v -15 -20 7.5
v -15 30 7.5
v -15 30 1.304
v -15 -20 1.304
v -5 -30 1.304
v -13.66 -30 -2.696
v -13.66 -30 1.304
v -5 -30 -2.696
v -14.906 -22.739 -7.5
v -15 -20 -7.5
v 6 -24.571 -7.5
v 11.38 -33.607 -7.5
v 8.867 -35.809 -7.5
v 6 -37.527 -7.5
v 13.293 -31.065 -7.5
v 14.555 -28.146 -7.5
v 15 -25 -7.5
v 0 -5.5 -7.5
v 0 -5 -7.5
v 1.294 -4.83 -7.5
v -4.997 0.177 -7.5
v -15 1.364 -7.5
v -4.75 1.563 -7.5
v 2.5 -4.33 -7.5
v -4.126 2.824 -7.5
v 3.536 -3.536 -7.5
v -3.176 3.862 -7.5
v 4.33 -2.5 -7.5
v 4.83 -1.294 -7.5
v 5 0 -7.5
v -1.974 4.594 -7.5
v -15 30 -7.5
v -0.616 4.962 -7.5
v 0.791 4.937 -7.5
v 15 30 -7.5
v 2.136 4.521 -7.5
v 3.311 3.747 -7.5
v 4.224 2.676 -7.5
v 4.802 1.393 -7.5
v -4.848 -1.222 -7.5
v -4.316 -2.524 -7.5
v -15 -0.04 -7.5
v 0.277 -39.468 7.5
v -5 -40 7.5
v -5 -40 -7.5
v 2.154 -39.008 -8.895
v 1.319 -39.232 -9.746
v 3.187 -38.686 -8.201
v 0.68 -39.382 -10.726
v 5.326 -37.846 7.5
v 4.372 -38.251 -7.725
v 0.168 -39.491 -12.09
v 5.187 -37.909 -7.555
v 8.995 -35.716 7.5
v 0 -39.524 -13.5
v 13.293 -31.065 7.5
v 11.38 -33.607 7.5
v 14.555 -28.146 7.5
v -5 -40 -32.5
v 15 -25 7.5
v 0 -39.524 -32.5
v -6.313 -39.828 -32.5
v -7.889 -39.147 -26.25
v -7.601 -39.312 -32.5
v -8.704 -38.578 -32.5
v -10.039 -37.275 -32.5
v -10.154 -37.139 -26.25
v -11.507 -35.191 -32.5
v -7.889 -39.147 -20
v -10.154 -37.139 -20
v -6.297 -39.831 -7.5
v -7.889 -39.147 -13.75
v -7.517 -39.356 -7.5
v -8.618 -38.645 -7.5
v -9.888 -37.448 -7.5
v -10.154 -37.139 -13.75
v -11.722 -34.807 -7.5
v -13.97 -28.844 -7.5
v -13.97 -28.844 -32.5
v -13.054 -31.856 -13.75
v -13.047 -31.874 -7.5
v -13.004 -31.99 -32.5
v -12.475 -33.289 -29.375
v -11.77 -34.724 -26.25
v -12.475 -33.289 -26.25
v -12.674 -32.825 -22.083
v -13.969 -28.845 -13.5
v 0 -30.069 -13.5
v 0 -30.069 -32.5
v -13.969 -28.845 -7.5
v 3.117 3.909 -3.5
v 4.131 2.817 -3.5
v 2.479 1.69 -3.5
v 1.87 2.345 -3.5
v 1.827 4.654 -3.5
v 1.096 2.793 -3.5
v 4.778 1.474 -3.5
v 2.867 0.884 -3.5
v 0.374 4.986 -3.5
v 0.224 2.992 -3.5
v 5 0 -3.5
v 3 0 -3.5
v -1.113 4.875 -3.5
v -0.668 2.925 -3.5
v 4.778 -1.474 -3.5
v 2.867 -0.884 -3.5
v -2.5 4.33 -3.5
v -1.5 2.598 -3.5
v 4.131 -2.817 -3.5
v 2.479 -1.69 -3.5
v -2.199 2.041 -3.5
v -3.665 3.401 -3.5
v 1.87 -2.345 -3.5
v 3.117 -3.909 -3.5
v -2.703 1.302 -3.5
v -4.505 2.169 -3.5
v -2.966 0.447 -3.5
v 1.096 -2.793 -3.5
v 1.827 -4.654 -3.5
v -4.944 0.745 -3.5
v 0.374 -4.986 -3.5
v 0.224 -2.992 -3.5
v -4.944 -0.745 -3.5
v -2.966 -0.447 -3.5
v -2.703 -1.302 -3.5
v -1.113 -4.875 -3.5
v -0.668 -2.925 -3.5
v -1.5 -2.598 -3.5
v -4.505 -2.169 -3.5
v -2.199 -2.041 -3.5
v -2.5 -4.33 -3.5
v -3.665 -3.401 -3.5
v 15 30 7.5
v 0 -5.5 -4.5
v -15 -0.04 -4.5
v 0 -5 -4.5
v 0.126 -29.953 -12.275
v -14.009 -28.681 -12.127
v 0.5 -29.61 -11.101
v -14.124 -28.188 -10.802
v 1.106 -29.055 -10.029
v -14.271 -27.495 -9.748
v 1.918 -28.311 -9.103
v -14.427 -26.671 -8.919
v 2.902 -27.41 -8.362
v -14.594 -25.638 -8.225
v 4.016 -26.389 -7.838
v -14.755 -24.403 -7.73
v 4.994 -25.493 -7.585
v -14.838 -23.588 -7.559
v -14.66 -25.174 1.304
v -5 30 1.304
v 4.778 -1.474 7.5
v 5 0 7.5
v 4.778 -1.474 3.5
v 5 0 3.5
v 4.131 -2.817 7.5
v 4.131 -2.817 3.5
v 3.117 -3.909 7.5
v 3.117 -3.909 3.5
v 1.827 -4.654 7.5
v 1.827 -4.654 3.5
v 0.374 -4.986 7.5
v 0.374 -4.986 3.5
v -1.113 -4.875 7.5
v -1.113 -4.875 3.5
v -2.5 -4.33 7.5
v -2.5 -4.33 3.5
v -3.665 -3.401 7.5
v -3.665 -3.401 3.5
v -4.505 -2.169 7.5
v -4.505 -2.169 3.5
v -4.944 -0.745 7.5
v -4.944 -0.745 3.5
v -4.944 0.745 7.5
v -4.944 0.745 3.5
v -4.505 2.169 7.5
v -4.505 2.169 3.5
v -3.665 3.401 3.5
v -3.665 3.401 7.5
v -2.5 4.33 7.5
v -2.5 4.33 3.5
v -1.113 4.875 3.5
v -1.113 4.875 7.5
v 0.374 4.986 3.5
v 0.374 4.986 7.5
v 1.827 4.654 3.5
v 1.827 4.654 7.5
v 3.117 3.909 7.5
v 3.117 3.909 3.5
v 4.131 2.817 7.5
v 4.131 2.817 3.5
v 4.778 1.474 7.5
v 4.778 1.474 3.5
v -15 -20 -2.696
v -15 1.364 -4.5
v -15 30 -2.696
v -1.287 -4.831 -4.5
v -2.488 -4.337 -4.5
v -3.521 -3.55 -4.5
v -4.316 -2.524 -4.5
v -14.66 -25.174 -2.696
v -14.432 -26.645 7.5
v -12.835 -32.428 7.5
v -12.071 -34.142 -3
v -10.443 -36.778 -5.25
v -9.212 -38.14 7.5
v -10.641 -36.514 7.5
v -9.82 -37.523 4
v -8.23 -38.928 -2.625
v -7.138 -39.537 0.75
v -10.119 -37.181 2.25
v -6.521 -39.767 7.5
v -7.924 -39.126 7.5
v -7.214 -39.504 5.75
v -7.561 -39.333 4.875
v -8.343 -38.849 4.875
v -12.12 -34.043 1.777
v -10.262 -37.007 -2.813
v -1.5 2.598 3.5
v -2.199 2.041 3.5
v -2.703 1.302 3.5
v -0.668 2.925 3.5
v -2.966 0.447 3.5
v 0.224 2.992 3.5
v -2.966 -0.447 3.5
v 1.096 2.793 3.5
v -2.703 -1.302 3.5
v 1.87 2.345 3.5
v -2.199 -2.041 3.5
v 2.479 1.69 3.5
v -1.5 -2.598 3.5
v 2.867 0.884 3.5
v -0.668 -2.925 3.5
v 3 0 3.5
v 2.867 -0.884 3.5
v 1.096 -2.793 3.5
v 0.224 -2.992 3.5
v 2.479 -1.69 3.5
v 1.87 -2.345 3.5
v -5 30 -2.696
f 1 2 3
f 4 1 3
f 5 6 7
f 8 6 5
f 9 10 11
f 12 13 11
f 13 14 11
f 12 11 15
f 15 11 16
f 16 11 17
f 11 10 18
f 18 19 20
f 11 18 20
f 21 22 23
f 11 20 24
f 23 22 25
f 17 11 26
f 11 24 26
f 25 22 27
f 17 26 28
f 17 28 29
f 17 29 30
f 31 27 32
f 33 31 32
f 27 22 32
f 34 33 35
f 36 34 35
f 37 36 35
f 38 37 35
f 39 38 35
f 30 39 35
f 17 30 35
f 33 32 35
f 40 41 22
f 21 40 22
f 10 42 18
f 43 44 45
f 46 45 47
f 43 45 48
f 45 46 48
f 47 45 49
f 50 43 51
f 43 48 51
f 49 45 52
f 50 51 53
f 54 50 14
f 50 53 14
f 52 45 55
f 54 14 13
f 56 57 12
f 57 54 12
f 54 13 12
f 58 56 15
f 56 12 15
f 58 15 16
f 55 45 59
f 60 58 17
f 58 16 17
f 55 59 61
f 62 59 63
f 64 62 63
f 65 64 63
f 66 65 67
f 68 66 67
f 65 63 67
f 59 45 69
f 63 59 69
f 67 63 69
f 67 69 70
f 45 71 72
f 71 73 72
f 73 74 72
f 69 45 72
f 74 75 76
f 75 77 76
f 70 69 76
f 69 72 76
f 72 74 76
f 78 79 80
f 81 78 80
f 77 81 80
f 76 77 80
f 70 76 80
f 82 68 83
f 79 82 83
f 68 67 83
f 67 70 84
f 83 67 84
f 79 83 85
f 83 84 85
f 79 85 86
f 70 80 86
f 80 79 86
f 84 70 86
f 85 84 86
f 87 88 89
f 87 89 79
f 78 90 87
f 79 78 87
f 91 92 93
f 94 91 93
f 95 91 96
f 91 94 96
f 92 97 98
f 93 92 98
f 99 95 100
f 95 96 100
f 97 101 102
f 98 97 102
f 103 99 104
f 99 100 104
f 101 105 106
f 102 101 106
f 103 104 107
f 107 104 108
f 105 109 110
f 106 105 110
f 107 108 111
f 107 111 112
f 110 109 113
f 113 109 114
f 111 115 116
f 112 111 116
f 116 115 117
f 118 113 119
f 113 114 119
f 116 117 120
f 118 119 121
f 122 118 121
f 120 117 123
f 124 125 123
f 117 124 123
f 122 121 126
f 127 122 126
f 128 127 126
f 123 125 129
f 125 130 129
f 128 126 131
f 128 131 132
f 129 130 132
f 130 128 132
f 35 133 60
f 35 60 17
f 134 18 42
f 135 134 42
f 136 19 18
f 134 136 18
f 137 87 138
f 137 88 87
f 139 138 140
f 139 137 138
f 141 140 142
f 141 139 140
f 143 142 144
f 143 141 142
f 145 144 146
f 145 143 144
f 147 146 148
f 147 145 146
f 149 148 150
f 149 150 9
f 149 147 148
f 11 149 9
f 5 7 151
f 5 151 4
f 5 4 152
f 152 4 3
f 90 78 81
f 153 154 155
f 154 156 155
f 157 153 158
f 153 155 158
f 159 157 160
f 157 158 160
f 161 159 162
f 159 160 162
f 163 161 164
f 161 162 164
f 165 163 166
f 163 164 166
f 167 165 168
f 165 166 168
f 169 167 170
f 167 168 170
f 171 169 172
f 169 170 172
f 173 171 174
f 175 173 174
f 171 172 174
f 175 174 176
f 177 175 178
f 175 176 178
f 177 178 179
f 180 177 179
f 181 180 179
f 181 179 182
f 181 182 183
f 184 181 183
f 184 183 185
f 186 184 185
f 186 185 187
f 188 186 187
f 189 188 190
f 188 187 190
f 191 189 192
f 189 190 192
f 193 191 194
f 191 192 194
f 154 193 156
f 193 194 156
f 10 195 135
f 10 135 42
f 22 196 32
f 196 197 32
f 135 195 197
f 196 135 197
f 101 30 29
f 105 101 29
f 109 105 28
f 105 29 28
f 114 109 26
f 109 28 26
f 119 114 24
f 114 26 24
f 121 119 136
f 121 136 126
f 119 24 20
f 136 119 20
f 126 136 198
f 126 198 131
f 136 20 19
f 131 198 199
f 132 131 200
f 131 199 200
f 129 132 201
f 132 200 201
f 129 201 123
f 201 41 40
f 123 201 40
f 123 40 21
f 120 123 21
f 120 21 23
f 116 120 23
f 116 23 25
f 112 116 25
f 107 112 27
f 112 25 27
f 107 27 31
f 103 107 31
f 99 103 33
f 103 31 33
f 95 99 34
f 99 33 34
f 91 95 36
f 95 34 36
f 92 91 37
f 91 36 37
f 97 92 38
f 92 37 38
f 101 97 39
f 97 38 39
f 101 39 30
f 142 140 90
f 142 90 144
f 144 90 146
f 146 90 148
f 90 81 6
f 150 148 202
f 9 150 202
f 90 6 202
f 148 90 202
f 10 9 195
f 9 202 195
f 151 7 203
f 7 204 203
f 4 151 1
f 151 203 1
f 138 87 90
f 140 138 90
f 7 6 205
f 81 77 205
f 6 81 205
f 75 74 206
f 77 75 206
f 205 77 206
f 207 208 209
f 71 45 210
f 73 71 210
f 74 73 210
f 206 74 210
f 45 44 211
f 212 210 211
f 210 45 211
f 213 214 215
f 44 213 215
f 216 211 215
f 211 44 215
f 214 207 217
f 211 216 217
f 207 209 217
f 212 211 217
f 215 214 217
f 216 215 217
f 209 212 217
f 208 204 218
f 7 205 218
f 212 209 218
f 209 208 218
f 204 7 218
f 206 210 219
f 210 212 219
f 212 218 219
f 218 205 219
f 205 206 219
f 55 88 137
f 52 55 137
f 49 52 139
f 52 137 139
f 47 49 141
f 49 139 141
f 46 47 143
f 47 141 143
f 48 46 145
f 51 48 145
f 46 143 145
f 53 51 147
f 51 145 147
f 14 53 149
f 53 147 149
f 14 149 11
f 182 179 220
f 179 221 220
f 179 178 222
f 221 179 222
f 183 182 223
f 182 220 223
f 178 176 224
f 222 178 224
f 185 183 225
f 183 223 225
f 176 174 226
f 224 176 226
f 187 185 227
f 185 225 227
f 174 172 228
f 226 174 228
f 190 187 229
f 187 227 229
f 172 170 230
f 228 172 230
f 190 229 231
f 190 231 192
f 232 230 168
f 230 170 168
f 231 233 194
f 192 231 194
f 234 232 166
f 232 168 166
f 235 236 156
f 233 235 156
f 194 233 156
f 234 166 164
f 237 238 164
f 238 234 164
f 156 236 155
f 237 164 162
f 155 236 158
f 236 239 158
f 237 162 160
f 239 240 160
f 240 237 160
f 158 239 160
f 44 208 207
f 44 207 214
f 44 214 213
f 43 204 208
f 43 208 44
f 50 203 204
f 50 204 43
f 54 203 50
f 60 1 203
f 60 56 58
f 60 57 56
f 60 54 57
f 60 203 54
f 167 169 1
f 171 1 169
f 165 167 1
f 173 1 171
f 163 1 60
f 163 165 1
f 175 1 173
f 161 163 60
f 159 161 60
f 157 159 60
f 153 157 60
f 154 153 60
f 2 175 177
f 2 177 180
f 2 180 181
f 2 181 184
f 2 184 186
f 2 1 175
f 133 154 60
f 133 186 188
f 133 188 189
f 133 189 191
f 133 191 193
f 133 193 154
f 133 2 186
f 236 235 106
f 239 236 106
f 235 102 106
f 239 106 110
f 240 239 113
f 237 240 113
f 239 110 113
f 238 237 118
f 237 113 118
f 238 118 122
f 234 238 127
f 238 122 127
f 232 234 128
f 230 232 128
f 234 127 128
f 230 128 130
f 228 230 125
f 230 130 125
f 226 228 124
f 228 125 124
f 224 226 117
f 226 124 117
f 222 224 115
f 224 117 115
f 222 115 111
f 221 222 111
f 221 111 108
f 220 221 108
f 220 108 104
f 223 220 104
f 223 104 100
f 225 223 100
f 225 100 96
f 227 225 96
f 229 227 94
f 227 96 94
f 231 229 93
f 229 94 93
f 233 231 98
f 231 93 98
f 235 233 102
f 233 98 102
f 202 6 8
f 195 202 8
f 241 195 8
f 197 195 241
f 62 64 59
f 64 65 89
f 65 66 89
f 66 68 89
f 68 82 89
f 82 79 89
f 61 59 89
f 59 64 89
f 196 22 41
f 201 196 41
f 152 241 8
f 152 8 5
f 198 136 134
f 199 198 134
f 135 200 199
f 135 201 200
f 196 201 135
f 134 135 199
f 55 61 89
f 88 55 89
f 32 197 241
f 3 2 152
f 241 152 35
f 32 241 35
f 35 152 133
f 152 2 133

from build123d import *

# Parameters (mm, degrees)
SKETCH1_W           = 30
SKETCH1_H           = 60
BOSS_EXTRUDE1_DEPTH = 7.5
SKETCH4_W           = 4
SKETCH4_H           = 60
CUT_EXTRUDE1_DEPTH  = 10
CUT_EXTRUDE2_DEPTH  = 3
SKETCH6_W           = 30
SKETCH6_H           = 15
BOSS_EXTRUDE2_DEPTH = 10
FILLET1_SIZE        = 10
FILLET1_SIZE_2      = 20
BOSS_EXTRUDE3_DEPTH = 25
FILLET2_SIZE        = 20
FILLET2_SIZE_2      = 15
FILLET3_R           = 6
FILLET4_R           = 6


with BuildPart() as part:
    # Sketch1 → Boss-Extrude1 (new, symmetric)
    with BuildSketch(Plane.XY):
        Rectangle(SKETCH1_W, SKETCH1_H)
    extrude(amount=BOSS_EXTRUDE1_DEPTH, both=True)

    # Sketch3 → Cut-Revolve1 (revolve, cut)
    with BuildSketch(Plane(origin=(0, 0, 0), x_dir=(0, 0, -1), z_dir=(1, 0, 0)), mode=Mode.PRIVATE) as cut_revolve1_sk:
        Polygon((-7.5, -5), (-3.5, -5), (-3.5, -3), (3.5, -3), (3.5, -5), (7.5, -5), (7.5, 0), (-7.5, 0), align=None)
    revolve(cut_revolve1_sk.sketch.rotate(Axis((0, 0, 19.169416837), (0, 0, -1)), 270), axis=Axis((0, 0, 19.169416837), (0, 0, -1)), mode=Mode.SUBTRACT)

    # Sketch4 → Cut-Extrude1 (cut)
    with BuildSketch(Plane.ZY.offset(15)):
        with Locations((-0.695939916, 0)):
            Rectangle(SKETCH4_W, SKETCH4_H)
    extrude(amount=-CUT_EXTRUDE1_DEPTH, mode=Mode.SUBTRACT)

    # Sketch5 → Cut-Extrude2 (cut)
    with BuildSketch(Plane.XY.offset(-7.5)):
        Polygon((0, -5.5), (-15, -0.040446486), (-15, 1.364268174), (0, -4.09528534), align=None)
    extrude(amount=CUT_EXTRUDE2_DEPTH, mode=Mode.SUBTRACT)

    # Sketch6 → Boss-Extrude2 (add)
    with BuildSketch(Plane(origin=(0, -30, 0), x_dir=(1, 0, 0), z_dir=(0, 1, 0))):
        Rectangle(SKETCH6_W, SKETCH6_H)
    extrude(amount=-BOSS_EXTRUDE2_DEPTH)

    # Fillet1
    # an asymmetric fillet: 20, 10 mm, written as the material it takes off along each edge
    with BuildSketch(Plane(origin=(-15, -40, 57.5), x_dir=(1, 0, 0), z_dir=(0, 0, -1))) as fillet1_piece_1:
        with BuildLine():
            Bezier((FILLET1_SIZE, 0), (0, 0), (0, -FILLET1_SIZE_2), weights=[1, 0.707106781, 1])
            Line((0, -FILLET1_SIZE_2), (0, 0))
            Line((0, 0), (FILLET1_SIZE, 0))
        make_face()
    extrude(amount=115, mode=Mode.SUBTRACT)

    # Sketch7<5> → Boss-Extrude3 (add)
    with BuildSketch(Plane(origin=(0, 0, -7.5), x_dir=(-1, 0, 0), z_dir=(0, 0, -1))):
        with BuildLine():
            Line((0, -30.068567995), (13.97008046, -28.844444564))
            add(Edge.make_bspline(
                [(5, -40), (6.475610406, -40), (7.888971767, -39.147202629), (9.083741797, -38.42629942), (10.154249723, -37.138694208), (11.86770272, -35.0777557), (13.053604417, -31.855708482), (13.581598782, -30.421169024), (13.97008046, -28.844444564)],
                knots=[0, 0, 0, 0.125, 0.125, 0.25, 0.25, 0.5, 0.5, 0.633954119, 0.633954119, 0.633954119], degree=2))
            Line((5, -40), (0, -40))
            Line((0, -40), (0, -30.068567995))
        make_face()
    extrude(amount=BOSS_EXTRUDE3_DEPTH)

    # Fillet2
    # an asymmetric fillet: 20, 15 mm, written as the material it takes off along each edge
    with BuildSketch(Plane(origin=(15, -40, -57.5), x_dir=(-1, 0, 0), z_dir=(0, 0, 1))) as fillet2_piece_1:
        with BuildLine():
            Bezier((FILLET2_SIZE, 0), (0, 0), (0, -FILLET2_SIZE_2), weights=[1, 0.707106781, 1])
            Line((0, -FILLET2_SIZE_2), (0, 0))
            Line((0, 0), (FILLET2_SIZE, 0))
        make_face()
    extrude(amount=115, mode=Mode.SUBTRACT)

    # Fillet3
    fillet3_edges = [part.edges().sort_by_distance(p)[0] for p in [
        (0, -34.796127772, -7.5),
    ]]
    fillet(fillet3_edges, radius=FILLET3_R)

    # Fillet4
    fillet4_edges = [part.edges().sort_by_distance(p)[0] for p in [
        (-3.984516256, -29.719426147, -7.5),
    ]]
    fillet(fillet4_edges, radius=FILLET4_R)


solid = part.part
